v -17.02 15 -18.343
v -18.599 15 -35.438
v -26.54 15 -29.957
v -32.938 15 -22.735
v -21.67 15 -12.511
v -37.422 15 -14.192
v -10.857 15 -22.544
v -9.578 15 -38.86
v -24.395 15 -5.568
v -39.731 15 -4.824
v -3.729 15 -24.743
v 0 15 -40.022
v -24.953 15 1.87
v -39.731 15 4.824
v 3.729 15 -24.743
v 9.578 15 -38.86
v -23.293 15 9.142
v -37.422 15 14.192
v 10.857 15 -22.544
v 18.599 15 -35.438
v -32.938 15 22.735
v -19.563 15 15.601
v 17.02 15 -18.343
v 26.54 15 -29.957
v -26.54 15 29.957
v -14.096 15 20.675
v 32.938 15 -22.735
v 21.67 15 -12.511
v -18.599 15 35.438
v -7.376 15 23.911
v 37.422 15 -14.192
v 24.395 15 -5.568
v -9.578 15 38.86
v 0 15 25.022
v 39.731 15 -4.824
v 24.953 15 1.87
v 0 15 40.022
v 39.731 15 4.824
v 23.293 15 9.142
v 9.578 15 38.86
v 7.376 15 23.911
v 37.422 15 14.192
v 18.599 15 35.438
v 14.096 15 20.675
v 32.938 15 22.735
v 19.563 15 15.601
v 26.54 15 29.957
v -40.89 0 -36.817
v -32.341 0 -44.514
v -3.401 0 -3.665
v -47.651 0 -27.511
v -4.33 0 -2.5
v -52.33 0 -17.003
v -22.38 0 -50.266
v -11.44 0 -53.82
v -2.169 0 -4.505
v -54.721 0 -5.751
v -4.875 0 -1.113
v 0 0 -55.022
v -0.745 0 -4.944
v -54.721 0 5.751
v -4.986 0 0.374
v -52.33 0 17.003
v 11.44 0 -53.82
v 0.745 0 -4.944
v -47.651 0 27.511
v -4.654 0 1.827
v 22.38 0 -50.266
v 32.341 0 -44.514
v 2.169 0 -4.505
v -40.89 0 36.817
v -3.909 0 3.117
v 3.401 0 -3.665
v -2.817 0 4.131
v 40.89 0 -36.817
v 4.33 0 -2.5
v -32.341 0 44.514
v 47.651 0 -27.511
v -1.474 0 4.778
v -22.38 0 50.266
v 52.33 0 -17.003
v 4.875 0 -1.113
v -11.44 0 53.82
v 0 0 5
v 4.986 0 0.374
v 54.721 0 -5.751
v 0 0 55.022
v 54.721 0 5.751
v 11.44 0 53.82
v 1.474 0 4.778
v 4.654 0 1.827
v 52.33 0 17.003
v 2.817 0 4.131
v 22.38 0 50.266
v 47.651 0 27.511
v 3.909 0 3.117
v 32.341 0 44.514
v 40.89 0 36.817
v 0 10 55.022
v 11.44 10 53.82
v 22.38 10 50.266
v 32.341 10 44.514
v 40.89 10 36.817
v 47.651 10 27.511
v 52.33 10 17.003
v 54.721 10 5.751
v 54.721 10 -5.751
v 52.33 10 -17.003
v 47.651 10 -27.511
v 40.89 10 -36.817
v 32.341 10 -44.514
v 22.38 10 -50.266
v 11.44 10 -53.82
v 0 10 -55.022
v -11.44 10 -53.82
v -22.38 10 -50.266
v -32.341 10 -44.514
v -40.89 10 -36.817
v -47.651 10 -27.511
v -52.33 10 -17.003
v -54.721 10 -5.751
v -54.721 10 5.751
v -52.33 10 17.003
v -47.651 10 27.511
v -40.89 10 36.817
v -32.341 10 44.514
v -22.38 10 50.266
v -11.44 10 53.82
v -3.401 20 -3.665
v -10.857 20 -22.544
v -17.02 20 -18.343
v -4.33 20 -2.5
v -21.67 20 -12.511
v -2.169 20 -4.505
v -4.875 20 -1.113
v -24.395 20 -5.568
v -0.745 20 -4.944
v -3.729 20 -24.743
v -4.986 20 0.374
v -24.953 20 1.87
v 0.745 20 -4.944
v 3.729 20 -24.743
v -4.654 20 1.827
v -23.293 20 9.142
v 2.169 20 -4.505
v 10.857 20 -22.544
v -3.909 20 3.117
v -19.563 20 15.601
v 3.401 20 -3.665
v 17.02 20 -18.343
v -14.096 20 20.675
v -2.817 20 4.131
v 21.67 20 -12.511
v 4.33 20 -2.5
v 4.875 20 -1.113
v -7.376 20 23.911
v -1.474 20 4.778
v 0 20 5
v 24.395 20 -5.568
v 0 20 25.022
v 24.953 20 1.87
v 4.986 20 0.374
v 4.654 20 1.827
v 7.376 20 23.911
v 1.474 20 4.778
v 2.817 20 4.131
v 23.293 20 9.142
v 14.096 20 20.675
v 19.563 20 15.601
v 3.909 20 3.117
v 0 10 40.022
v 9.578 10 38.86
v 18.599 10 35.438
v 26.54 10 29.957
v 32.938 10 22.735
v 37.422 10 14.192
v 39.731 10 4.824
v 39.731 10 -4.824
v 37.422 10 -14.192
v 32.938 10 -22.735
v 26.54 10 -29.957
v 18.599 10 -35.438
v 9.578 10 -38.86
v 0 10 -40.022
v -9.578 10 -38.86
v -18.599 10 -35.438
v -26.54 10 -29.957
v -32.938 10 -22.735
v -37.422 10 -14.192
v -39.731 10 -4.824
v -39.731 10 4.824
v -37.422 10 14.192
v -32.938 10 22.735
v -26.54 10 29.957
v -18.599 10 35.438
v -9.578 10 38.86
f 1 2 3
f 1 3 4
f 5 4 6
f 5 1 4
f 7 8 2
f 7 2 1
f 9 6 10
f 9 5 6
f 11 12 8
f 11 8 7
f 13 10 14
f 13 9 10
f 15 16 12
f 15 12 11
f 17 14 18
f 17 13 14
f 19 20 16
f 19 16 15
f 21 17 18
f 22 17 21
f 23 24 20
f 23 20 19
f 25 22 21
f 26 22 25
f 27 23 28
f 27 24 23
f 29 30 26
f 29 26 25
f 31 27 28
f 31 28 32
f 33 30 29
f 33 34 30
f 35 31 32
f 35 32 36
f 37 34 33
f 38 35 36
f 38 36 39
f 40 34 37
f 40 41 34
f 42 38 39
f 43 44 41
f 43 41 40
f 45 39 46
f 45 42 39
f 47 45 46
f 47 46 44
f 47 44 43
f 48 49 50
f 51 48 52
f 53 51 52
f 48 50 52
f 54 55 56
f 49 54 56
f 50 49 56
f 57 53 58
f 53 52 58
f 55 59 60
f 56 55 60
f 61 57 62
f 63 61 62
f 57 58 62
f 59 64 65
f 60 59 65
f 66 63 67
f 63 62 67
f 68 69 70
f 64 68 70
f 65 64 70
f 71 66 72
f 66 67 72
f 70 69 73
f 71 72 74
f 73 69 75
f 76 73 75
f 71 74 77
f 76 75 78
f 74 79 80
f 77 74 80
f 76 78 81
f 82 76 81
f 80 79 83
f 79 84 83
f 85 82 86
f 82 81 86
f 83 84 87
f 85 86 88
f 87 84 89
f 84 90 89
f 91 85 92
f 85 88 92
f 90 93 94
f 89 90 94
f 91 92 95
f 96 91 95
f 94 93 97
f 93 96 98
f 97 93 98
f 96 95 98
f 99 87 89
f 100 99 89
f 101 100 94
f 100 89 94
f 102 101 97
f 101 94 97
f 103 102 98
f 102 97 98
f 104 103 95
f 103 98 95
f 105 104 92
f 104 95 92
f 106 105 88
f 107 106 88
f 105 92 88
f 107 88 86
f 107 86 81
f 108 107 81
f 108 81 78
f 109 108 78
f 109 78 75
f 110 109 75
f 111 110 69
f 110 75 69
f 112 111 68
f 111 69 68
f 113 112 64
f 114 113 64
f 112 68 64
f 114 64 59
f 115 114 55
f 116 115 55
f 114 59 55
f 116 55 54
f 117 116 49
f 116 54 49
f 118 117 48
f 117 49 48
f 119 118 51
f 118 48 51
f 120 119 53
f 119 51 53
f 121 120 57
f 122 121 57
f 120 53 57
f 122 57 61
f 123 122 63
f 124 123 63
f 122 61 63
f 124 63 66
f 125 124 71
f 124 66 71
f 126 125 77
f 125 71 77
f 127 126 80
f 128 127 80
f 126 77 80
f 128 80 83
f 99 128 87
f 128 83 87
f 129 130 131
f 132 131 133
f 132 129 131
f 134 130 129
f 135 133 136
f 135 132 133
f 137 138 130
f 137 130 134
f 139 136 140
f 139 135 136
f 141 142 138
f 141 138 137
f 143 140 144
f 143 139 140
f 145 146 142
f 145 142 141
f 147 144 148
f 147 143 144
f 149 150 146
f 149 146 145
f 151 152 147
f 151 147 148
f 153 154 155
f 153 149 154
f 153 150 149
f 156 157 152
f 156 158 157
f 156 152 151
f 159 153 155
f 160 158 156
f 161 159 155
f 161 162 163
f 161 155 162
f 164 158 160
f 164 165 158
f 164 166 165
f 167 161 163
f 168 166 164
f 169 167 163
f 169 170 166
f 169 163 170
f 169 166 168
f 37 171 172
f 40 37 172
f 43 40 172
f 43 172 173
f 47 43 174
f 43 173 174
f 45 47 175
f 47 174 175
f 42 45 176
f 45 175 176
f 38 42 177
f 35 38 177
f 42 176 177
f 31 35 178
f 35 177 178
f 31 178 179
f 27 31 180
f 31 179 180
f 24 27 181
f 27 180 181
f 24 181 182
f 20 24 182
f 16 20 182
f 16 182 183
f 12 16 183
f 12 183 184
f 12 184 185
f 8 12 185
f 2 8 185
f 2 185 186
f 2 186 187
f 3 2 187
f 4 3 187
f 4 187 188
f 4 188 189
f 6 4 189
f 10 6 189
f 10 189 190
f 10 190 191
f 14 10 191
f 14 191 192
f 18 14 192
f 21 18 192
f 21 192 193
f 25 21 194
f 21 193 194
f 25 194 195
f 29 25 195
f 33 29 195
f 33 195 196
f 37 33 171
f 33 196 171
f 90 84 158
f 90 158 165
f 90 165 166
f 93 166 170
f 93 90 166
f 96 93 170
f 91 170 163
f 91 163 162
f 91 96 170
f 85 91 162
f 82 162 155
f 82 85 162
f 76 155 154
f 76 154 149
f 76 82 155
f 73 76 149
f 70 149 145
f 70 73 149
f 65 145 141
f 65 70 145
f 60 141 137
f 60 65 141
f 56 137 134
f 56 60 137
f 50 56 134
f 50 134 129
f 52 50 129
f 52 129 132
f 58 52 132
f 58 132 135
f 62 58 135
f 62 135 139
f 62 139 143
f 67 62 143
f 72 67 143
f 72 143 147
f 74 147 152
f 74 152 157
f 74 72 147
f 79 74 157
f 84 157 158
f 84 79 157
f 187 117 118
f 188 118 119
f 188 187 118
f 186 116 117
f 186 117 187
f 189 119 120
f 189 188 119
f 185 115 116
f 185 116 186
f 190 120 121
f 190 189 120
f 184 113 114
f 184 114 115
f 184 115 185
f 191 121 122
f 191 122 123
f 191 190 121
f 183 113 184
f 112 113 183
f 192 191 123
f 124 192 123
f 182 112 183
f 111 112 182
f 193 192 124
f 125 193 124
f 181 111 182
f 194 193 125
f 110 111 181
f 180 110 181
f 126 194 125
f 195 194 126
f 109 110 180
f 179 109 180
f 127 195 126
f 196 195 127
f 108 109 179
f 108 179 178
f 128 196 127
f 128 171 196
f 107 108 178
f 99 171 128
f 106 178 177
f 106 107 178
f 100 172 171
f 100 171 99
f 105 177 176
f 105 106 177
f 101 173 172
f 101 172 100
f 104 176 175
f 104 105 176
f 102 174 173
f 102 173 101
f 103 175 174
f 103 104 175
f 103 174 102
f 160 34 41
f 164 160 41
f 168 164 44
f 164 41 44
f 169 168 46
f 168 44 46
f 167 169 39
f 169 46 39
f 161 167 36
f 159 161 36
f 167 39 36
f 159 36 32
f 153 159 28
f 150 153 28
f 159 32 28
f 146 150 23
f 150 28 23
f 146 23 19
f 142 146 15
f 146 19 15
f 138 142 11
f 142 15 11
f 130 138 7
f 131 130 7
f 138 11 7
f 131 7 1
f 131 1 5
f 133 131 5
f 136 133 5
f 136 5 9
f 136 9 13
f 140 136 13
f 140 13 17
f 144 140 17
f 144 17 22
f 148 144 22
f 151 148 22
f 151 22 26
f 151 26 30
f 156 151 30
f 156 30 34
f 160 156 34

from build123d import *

# Parameters (mm, degrees)
SCHIZZO2_R                   = 55.0225
SCHIZZO2_R_2                 = 40.0225
ESTRUSIONE_ESTRUSIONE1_DEPTH = 10
SCHIZZO2_3_R                 = 40.0225
SCHIZZO2_3_R_2               = 25.0225
ESTRUSIONE_ESTRUSIONE2_DEPTH = 15
SCHIZZO2_4_R                 = 25.0225
SCHIZZO2_4_R_2               = 5
ESTRUSIONE_ESTRUSIONE3_DEPTH = 20


with BuildPart() as part:
    # Schizzo2 → Estrusione-Estrusione1 (new body)
    with BuildSketch(Plane(origin=(0, 0, 0), x_dir=(1, 0, 0), z_dir=(0, 1, 0))):
        Circle(SCHIZZO2_R)
        Circle(SCHIZZO2_R_2, mode=Mode.SUBTRACT)
    extrude(amount=ESTRUSIONE_ESTRUSIONE1_DEPTH)

    # Schizzo2<3> → Estrusione-Estrusione2 (add)
    with BuildSketch(Plane(origin=(0, 0, 0), x_dir=(1, 0, 0), z_dir=(0, 1, 0))):
        Circle(SCHIZZO2_3_R)
        Circle(SCHIZZO2_3_R_2, mode=Mode.SUBTRACT)
    extrude(amount=ESTRUSIONE_ESTRUSIONE2_DEPTH)

    # Schizzo2<4> → Estrusione-Estrusione3 (add)
    with BuildSketch(Plane(origin=(0, 0, 0), x_dir=(1, 0, 0), z_dir=(0, 1, 0))):
        Circle(SCHIZZO2_4_R)
        Circle(SCHIZZO2_4_R_2, mode=Mode.SUBTRACT)
    extrude(amount=ESTRUSIONE_ESTRUSIONE3_DEPTH)


solid = part.part
